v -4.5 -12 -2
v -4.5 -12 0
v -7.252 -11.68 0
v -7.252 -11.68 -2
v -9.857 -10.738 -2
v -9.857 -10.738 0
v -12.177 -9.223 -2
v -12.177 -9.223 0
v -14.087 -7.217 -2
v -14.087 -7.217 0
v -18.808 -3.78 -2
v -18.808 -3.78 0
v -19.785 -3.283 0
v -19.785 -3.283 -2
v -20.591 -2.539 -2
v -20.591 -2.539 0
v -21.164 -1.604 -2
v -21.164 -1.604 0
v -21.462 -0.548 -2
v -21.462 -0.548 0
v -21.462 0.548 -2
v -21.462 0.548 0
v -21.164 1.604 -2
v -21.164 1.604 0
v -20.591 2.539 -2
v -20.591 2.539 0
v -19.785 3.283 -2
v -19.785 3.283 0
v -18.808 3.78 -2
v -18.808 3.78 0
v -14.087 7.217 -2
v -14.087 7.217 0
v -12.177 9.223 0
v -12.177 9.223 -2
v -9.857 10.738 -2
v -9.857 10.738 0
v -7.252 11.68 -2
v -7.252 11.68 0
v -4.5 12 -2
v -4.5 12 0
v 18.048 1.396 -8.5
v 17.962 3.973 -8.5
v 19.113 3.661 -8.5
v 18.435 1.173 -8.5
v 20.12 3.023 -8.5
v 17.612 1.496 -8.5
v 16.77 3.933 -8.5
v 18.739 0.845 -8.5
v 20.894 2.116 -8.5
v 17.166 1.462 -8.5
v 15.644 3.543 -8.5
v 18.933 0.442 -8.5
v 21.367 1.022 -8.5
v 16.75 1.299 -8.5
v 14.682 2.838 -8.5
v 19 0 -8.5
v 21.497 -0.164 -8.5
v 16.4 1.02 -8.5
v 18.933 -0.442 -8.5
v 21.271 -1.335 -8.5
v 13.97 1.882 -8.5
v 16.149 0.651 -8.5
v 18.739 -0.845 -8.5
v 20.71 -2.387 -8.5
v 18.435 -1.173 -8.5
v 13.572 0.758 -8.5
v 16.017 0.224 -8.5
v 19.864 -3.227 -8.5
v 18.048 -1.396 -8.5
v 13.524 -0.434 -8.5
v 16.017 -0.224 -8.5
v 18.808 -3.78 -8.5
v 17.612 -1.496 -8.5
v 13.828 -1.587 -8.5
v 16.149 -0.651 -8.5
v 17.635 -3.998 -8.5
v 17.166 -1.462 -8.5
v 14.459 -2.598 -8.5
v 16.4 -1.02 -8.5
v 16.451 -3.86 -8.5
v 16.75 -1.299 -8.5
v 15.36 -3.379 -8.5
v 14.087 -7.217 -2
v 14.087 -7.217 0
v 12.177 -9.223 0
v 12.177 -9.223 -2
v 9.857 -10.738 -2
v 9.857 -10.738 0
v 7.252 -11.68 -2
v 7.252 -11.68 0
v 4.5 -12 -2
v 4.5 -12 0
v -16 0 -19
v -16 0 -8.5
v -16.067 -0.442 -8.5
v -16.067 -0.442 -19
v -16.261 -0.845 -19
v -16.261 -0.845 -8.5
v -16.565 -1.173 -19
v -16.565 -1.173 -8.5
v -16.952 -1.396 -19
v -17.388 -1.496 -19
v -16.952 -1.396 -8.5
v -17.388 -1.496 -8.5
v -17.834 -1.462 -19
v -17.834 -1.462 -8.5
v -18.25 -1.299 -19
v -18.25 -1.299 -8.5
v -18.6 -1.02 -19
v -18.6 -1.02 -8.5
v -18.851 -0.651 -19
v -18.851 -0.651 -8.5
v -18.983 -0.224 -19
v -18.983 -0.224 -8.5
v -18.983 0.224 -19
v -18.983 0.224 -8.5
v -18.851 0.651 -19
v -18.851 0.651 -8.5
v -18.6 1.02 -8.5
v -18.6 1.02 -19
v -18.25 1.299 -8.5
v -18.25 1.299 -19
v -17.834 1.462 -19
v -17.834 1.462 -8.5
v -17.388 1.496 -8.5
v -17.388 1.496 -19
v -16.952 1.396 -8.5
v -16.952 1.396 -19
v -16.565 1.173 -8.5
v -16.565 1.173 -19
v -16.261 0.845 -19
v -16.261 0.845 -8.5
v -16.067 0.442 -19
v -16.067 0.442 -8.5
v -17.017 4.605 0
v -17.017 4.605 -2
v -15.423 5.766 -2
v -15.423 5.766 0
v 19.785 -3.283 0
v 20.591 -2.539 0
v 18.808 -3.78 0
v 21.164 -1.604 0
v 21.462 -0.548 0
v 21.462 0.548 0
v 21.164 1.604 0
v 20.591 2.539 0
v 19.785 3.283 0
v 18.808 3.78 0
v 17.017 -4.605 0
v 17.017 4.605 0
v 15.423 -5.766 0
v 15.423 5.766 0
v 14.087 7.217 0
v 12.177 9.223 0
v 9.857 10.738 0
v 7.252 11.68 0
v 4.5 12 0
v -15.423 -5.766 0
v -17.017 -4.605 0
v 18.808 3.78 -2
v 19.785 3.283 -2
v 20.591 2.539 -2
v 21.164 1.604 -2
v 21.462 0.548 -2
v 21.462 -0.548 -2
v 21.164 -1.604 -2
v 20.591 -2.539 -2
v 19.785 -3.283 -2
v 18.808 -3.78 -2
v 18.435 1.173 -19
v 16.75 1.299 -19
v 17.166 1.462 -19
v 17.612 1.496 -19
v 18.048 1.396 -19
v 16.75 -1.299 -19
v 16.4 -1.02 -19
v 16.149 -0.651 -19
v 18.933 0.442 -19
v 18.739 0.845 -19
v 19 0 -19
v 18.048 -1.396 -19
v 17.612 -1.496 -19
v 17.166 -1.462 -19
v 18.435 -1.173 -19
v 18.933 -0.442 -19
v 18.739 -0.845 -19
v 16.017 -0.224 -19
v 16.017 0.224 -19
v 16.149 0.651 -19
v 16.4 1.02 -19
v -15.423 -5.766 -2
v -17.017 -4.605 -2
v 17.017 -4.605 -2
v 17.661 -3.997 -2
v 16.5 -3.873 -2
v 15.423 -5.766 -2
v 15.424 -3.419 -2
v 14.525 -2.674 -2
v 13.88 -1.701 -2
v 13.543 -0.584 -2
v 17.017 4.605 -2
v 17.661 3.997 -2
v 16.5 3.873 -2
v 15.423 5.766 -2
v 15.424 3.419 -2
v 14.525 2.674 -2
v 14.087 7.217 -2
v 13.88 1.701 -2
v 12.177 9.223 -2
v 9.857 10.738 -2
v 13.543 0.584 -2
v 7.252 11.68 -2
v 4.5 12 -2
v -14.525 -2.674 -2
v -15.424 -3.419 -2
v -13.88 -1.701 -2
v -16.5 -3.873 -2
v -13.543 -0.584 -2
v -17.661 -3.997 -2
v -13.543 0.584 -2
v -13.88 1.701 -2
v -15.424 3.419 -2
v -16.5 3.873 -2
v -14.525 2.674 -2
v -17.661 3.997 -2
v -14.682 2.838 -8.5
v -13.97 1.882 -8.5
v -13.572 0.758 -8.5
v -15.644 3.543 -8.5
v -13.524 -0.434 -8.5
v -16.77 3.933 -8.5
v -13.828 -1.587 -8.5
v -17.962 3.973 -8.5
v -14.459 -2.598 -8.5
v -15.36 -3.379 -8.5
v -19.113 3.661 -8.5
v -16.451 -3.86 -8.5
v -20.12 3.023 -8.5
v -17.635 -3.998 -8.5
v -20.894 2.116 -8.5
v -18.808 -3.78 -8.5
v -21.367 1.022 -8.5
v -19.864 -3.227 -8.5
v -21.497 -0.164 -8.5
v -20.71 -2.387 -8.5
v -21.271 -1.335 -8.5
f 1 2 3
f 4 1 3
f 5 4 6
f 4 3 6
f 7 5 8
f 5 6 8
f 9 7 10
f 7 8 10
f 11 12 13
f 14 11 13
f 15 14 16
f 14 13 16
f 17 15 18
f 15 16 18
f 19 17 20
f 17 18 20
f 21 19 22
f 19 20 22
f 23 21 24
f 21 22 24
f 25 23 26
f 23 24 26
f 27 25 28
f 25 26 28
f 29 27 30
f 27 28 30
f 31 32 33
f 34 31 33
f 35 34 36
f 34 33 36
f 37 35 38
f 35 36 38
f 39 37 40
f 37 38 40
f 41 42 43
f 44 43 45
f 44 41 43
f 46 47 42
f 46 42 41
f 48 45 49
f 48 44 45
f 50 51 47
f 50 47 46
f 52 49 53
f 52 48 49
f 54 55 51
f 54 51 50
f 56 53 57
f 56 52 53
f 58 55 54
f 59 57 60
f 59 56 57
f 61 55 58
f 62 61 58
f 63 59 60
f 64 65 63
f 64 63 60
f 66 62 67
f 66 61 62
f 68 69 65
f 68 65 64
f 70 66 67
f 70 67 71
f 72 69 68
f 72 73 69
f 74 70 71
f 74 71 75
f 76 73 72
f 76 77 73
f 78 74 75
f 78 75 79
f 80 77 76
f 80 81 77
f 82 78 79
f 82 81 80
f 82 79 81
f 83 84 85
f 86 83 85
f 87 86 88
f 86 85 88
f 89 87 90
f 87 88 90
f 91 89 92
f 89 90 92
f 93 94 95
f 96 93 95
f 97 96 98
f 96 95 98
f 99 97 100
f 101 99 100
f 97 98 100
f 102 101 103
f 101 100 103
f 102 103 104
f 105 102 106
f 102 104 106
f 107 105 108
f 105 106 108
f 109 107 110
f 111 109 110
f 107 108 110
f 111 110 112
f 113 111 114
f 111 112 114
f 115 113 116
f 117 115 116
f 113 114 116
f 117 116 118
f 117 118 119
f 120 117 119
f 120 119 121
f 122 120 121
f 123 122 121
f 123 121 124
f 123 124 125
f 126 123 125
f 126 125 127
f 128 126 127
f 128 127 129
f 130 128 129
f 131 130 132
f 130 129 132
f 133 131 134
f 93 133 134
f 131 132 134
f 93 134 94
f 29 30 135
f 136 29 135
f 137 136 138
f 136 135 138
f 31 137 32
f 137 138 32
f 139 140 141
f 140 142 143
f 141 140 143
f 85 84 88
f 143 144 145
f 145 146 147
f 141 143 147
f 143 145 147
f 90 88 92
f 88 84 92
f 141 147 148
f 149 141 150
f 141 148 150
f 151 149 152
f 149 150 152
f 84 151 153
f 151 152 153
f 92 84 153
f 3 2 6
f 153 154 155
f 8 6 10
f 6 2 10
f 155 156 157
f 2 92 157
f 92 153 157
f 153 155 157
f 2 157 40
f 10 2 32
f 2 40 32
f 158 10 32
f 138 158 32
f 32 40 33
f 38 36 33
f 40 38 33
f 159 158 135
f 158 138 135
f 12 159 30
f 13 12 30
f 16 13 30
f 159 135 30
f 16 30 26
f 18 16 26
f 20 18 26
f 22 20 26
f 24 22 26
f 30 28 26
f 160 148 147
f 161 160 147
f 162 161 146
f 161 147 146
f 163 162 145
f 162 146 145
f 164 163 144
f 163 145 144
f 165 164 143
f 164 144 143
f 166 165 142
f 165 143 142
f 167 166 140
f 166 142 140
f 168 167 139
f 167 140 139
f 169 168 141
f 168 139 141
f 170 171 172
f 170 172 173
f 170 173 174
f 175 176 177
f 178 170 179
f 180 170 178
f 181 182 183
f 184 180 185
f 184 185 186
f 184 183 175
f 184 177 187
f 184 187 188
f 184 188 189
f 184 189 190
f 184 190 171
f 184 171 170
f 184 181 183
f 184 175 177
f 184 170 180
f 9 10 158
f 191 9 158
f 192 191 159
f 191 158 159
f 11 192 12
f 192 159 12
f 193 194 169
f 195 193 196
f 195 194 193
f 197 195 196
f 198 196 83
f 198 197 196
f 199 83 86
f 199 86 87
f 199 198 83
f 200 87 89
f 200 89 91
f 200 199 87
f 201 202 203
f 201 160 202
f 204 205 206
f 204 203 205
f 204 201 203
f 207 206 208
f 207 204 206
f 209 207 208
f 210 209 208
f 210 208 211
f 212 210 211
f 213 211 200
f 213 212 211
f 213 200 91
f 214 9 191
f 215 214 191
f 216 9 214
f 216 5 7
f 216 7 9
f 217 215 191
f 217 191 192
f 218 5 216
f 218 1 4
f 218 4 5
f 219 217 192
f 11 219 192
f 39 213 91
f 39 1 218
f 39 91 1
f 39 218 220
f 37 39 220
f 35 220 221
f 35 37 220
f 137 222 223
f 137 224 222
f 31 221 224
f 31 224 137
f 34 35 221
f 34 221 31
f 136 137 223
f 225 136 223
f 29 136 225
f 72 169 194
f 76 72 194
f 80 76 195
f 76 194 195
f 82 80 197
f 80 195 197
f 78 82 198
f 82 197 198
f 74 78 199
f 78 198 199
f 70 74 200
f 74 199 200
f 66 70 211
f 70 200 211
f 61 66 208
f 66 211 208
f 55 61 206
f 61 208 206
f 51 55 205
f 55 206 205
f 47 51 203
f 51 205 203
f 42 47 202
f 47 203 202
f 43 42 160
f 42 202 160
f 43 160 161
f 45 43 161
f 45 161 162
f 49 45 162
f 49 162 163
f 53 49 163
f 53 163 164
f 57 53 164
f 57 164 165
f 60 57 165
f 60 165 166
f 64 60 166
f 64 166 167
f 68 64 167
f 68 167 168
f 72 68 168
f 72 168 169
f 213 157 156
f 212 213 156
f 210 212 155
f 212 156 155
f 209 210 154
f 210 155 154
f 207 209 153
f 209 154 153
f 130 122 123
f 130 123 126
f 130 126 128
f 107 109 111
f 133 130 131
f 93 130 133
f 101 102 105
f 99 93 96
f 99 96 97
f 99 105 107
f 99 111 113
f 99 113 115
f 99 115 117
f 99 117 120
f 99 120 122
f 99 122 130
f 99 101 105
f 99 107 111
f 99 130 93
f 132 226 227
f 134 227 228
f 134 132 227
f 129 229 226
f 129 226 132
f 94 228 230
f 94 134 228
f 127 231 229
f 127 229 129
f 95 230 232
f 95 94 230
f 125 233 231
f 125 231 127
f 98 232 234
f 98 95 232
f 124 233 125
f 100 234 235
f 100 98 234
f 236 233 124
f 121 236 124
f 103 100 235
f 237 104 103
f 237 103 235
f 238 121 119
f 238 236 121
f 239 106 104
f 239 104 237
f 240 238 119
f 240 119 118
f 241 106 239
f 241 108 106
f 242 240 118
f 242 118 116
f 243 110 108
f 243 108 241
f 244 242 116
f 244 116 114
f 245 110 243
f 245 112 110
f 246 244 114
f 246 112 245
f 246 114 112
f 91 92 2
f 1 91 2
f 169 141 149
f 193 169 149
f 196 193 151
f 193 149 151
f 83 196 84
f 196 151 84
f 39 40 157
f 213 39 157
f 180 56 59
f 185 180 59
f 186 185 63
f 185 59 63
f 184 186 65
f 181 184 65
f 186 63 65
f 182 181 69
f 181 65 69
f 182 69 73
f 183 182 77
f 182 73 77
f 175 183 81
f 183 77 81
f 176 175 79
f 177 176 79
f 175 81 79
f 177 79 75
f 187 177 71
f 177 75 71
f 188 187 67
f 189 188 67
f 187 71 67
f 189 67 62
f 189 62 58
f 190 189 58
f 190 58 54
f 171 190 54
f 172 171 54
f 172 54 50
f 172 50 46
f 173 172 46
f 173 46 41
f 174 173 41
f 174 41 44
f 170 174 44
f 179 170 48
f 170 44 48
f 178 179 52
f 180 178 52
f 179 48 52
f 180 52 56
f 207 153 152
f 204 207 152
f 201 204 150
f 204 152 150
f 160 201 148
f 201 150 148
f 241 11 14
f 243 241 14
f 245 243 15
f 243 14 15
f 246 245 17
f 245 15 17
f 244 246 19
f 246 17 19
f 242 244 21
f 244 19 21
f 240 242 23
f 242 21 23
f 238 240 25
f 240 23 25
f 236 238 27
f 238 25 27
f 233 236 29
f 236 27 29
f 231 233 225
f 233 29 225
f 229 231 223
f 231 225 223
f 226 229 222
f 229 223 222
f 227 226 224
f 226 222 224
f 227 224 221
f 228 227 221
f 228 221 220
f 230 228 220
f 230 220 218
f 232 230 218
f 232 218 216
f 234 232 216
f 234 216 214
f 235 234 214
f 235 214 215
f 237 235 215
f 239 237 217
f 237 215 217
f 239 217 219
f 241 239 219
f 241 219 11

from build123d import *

# Parameters (mm, degrees)
EXTRUDE_1_DEPTH = 2
SKETCH_2_R      = 4
EXTRUDE_2_DEPTH = 6.5
SKETCH_3_R      = 1.5
EXTRUDE_3_DEPTH = 10.5


with BuildPart() as part:
    # 草图1 → 凸台-拉伸1 (new body)
    with BuildSketch(Plane.XY):
        with BuildLine():
            Line((-4.5, 12), (4.5, 12))
            ThreePointArc((4.5, 12), (9.857189903, 10.7378078), (14.087412587, 7.216752724))
            ThreePointArc((14.087412587, 7.216752724), (16.191153731, 5.146301215), (18.807692308, 3.780203808))
            ThreePointArc((18.807692308, 3.780203808), (21.5, 0), (18.807692308, -3.780203808))
            ThreePointArc((18.807692308, -3.780203808), (16.191153731, -5.146301215), (14.087412587, -7.216752724))
            ThreePointArc((14.087412587, -7.216752724), (9.857189903, -10.7378078), (4.5, -12))
            Line((4.5, -12), (-4.5, -12))
            ThreePointArc((-4.5, -12), (-9.857189903, -10.7378078), (-14.087412587, -7.216752724))
            ThreePointArc((-14.087412587, -7.216752724), (-16.191153731, -5.146301215), (-18.807692308, -3.780203808))
            ThreePointArc((-18.807692308, -3.780203808), (-21.5, 0), (-18.807692308, 3.780203808))
            ThreePointArc((-18.807692308, 3.780203808), (-16.191153731, 5.146301215), (-14.087412587, 7.216752724))
            ThreePointArc((-14.087412587, 7.216752724), (-9.857189903, 10.7378078), (-4.5, 12))
        make_face()
    extrude(amount=-EXTRUDE_1_DEPTH)

    # 草图2 → 凸台-拉伸2 (add)
    with BuildSketch(Plane(origin=(0, 0, -2), x_dir=(-1, 0, 0), z_dir=(0, 0, -1))):
        with Locations(Location((17.5, 0, 0), (0, 0, 289.082124804))):
            Circle(SKETCH_2_R)
        with Locations(Location((-17.5, 0, 0), (0, 0, 250.917875196))):
            Circle(SKETCH_2_R)
    extrude(amount=EXTRUDE_2_DEPTH)

    # 草图3 → 凸台-拉伸3 (add)
    with BuildSketch(Plane(origin=(0, 0, -8.5), x_dir=(-1, 0, 0), z_dir=(0, 0, -1))):
        with Locations(Location((17.5, 0, 0), (0, 0, 180))):
            Circle(SKETCH_3_R)
        with Locations(Location((-17.5, 0, 0), (0, 0, 180))):
            Circle(SKETCH_3_R)
    extrude(amount=EXTRUDE_3_DEPTH)


solid = part.part
